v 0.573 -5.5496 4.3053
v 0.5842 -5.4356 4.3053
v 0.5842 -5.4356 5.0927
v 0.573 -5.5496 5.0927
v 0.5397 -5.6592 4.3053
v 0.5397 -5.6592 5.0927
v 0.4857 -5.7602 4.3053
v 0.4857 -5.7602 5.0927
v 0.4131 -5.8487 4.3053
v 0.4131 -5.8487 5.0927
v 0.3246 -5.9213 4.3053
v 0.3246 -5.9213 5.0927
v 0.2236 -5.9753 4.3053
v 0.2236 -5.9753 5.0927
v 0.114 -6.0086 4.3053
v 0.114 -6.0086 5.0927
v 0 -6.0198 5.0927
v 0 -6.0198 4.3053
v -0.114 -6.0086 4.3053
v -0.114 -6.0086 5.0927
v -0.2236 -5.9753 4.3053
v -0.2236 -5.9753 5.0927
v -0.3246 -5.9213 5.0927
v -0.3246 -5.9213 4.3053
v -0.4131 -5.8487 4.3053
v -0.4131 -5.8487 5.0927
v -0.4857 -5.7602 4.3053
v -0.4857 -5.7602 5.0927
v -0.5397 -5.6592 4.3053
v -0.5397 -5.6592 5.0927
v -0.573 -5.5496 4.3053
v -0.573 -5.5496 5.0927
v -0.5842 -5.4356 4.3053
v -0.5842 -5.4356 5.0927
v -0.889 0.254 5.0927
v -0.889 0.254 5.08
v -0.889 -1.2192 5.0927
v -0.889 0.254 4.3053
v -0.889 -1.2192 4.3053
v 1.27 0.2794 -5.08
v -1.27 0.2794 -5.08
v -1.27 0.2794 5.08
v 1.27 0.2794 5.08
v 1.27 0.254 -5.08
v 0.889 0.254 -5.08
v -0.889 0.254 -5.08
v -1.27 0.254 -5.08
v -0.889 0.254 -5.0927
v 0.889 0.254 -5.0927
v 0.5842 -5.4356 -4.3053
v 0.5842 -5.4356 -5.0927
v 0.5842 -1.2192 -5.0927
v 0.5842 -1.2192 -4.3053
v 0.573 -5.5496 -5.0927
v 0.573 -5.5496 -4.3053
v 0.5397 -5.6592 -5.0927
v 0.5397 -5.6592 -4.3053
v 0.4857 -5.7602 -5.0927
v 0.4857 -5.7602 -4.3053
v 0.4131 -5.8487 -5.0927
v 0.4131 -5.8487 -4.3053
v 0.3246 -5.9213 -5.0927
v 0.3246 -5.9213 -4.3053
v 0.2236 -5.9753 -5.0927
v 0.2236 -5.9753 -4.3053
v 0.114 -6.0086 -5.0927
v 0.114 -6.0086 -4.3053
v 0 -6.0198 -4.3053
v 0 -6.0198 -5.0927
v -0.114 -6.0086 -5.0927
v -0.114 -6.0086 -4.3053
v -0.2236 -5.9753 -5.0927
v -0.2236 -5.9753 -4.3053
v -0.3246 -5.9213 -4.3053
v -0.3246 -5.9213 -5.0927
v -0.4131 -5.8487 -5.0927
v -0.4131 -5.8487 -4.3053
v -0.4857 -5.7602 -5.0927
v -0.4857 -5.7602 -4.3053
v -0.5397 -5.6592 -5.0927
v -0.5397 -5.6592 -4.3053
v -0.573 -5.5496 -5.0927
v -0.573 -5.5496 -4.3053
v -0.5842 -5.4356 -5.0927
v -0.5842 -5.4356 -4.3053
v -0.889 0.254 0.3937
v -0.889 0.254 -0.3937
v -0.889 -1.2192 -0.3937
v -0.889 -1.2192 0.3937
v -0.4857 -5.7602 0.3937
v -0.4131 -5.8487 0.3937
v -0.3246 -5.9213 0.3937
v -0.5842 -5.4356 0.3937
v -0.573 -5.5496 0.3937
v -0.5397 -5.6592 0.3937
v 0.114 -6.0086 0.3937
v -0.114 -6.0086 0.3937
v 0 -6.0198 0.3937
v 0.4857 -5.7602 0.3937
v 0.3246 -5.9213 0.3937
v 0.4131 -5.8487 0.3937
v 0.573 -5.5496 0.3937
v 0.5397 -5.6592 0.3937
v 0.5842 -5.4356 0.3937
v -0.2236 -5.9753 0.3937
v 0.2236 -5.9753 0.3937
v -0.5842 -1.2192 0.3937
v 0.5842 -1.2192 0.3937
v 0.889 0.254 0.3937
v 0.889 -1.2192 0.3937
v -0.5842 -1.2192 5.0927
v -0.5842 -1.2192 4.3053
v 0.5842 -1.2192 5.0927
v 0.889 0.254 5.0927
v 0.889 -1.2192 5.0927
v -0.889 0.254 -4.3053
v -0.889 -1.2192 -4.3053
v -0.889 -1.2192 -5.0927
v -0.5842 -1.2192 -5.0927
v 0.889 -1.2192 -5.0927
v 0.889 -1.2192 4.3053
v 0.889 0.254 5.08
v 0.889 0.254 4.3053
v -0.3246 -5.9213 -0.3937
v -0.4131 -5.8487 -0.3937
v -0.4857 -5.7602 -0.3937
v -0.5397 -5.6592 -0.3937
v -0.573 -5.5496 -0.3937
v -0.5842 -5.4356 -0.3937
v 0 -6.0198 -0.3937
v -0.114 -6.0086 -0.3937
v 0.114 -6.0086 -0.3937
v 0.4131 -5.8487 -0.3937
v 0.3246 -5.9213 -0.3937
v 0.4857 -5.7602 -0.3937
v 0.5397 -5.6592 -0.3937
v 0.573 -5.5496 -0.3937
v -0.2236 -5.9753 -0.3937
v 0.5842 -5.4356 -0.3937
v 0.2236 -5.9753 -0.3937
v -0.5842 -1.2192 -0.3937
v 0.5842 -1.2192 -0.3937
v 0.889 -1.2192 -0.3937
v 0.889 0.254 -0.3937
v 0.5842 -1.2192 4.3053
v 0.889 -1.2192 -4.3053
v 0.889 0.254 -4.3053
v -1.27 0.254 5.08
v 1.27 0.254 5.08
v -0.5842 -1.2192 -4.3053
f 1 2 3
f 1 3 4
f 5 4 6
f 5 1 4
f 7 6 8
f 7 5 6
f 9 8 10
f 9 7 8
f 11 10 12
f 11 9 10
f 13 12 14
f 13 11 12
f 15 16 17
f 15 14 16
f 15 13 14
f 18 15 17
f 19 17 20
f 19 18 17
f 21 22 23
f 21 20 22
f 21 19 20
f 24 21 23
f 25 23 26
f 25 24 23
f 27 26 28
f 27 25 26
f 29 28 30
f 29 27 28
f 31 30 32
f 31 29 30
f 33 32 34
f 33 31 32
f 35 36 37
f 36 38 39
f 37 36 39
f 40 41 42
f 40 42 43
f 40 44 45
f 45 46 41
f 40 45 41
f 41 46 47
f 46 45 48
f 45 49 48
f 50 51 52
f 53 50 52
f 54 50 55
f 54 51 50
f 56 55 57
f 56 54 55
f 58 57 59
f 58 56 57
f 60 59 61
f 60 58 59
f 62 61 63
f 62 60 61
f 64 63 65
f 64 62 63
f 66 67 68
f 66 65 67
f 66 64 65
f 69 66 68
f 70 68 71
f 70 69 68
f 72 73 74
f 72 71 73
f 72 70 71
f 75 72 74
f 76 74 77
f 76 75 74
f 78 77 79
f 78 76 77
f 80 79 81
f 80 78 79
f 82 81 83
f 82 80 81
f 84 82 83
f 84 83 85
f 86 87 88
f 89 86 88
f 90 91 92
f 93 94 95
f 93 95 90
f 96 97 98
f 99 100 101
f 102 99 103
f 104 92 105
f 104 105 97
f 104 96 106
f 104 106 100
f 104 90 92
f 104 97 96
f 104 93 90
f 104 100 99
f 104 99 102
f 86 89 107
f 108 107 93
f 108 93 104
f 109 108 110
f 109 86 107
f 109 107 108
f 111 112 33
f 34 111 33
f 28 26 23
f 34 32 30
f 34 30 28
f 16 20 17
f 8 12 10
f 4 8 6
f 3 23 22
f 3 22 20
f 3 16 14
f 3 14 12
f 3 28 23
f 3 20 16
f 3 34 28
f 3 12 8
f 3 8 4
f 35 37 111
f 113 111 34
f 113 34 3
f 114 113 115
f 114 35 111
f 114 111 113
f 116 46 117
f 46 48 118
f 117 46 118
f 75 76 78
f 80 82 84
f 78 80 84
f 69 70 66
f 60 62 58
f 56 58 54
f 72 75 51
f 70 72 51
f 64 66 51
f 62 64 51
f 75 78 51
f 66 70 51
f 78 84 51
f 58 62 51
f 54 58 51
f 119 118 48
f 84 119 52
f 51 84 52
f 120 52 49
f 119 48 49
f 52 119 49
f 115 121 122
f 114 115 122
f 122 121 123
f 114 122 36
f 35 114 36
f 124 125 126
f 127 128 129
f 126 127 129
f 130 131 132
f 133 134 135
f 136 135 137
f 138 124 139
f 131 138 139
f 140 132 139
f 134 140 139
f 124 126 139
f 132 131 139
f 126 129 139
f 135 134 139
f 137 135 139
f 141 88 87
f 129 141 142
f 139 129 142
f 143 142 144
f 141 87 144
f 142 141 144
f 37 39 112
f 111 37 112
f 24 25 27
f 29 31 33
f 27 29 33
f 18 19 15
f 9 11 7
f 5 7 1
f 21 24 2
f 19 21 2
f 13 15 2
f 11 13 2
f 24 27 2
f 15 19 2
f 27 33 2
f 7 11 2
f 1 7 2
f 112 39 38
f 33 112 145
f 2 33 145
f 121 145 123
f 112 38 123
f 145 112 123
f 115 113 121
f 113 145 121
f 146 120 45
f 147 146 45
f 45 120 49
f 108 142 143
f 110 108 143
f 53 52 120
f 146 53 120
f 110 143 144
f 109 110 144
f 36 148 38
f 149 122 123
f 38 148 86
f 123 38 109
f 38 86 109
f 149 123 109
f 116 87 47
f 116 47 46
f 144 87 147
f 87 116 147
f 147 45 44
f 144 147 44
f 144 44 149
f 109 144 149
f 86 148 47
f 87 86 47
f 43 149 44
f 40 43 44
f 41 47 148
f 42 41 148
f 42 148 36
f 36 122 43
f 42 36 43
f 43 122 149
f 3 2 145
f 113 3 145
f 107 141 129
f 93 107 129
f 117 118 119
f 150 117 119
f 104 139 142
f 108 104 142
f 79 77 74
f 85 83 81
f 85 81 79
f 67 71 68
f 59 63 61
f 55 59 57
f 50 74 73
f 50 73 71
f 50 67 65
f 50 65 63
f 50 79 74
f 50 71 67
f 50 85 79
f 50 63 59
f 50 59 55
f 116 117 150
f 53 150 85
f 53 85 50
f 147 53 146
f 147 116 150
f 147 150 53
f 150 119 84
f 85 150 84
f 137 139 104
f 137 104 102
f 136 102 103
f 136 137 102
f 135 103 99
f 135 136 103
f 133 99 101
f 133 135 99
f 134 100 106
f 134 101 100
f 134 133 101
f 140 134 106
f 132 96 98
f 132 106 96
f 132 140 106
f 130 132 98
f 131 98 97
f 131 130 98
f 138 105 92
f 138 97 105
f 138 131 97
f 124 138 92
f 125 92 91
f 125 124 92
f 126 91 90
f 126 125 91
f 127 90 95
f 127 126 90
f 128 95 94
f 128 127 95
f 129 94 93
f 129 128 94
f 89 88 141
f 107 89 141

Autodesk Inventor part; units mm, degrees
sketch "Sketch_44" plane through (0, 0.254, 0) normal (0, 1, 0) x (1, 0, 0)
  line L0 (-1.27, -5.08) -> (1.27, -5.08)
  line L1 (1.27, -5.08) -> (1.27, 5.08)
  line L2 (1.27, 5.08) -> (-1.27, 5.08)
  line L3 (-1.27, 5.08) -> (-1.27, -5.08)
extrude "Extrusion1" add sketch "Sketch_44" along normal blind 0.0254
sketch "Sketch_2" plane through (0, 0, 0) normal (0, 0, 1) x (1, 0, 0)
  line L0 (-0.889, 0.254) -> (-0.889, -1.2192)
  line L1 (-0.889, -1.2192) -> (-0.5842, -1.2192)
  line L2 (-0.5842, -1.2192) -> (-0.5842, -5.4356)
  arc A0 (-0.5842, -5.4356) -> (0.5842, -5.4356) centre (0, -5.4356) ccw
  line L3 (0.5842, -5.4356) -> (0.5842, -1.2192)
  line L4 (0.5842, -1.2192) -> (0.889, -1.2192)
  line L5 (0.889, -1.2192) -> (0.889, 0.254)
  line L6 (0.889, 0.254) -> (-0.889, 0.254)
extrude "Extrusion2" add sketch "Sketch_2" along normal mid plane 0.7874
sketch "Sketch_3" plane through (0, 0, 4.699) normal (0, 0, 1) x (1, 0, 0)
  line L0 (-0.889, 0.254) -> (-0.889, -1.2192)
  line L1 (-0.889, -1.2192) -> (-0.5842, -1.2192)
  line L2 (-0.5842, -1.2192) -> (-0.5842, -5.4356)
  arc A0 (-0.5842, -5.4356) -> (0.5842, -5.4356) centre (0, -5.4356) ccw
  line L3 (0.5842, -5.4356) -> (0.5842, -1.2192)
  line L4 (0.5842, -1.2192) -> (0.889, -1.2192)
  line L5 (0.889, -1.2192) -> (0.889, 0.254)
  line L6 (0.889, 0.254) -> (-0.889, 0.254)
extrude "Extrusion3" add sketch "Sketch_3" along normal mid plane 0.7874
sketch "Sketch_4" plane through (0, 0, -4.699) normal (0, 0, 1) x (1, 0, 0)
  line L0 (-0.889, 0.254) -> (-0.889, -1.2192)
  line L1 (-0.889, -1.2192) -> (-0.5842, -1.2192)
  line L2 (-0.5842, -1.2192) -> (-0.5842, -5.4356)
  arc A0 (-0.5842, -5.4356) -> (0.5842, -5.4356) centre (0, -5.4356) ccw
  line L3 (0.5842, -5.4356) -> (0.5842, -1.2192)
  line L4 (0.5842, -1.2192) -> (0.889, -1.2192)
  line L5 (0.889, -1.2192) -> (0.889, 0.254)
  line L6 (0.889, 0.254) -> (-0.889, 0.254)
extrude "Extrusion4" add sketch "Sketch_4" along normal mid plane 0.7874
ref_plane "body_right_vert_XY" through (0, 0, 0) normal (0, 0, -1) x (1, 0, 0)
ref_plane "body_right_vert_YZ" through (0, 0, 0) normal (1, 0, 0) x (0, -1, 0)
ref_plane "body_right_vert_ZX" through (0, 0, 0) normal (0, -1, 0) x (0, 0, -1)
ref_plane "body_straight_XY" through (0, 0, 0) normal (0, -1, 0) x (1, 0, 0)
ref_plane "body_straight_YZ" through (0, 0, 0) normal (1, 0, 0) x (0, 0, 1)
ref_plane "body_straight_ZX" through (0, 0, 0) normal (0, 0, 1) x (0, -1, 0)
properties part number "M2T1SW03trmnls"
